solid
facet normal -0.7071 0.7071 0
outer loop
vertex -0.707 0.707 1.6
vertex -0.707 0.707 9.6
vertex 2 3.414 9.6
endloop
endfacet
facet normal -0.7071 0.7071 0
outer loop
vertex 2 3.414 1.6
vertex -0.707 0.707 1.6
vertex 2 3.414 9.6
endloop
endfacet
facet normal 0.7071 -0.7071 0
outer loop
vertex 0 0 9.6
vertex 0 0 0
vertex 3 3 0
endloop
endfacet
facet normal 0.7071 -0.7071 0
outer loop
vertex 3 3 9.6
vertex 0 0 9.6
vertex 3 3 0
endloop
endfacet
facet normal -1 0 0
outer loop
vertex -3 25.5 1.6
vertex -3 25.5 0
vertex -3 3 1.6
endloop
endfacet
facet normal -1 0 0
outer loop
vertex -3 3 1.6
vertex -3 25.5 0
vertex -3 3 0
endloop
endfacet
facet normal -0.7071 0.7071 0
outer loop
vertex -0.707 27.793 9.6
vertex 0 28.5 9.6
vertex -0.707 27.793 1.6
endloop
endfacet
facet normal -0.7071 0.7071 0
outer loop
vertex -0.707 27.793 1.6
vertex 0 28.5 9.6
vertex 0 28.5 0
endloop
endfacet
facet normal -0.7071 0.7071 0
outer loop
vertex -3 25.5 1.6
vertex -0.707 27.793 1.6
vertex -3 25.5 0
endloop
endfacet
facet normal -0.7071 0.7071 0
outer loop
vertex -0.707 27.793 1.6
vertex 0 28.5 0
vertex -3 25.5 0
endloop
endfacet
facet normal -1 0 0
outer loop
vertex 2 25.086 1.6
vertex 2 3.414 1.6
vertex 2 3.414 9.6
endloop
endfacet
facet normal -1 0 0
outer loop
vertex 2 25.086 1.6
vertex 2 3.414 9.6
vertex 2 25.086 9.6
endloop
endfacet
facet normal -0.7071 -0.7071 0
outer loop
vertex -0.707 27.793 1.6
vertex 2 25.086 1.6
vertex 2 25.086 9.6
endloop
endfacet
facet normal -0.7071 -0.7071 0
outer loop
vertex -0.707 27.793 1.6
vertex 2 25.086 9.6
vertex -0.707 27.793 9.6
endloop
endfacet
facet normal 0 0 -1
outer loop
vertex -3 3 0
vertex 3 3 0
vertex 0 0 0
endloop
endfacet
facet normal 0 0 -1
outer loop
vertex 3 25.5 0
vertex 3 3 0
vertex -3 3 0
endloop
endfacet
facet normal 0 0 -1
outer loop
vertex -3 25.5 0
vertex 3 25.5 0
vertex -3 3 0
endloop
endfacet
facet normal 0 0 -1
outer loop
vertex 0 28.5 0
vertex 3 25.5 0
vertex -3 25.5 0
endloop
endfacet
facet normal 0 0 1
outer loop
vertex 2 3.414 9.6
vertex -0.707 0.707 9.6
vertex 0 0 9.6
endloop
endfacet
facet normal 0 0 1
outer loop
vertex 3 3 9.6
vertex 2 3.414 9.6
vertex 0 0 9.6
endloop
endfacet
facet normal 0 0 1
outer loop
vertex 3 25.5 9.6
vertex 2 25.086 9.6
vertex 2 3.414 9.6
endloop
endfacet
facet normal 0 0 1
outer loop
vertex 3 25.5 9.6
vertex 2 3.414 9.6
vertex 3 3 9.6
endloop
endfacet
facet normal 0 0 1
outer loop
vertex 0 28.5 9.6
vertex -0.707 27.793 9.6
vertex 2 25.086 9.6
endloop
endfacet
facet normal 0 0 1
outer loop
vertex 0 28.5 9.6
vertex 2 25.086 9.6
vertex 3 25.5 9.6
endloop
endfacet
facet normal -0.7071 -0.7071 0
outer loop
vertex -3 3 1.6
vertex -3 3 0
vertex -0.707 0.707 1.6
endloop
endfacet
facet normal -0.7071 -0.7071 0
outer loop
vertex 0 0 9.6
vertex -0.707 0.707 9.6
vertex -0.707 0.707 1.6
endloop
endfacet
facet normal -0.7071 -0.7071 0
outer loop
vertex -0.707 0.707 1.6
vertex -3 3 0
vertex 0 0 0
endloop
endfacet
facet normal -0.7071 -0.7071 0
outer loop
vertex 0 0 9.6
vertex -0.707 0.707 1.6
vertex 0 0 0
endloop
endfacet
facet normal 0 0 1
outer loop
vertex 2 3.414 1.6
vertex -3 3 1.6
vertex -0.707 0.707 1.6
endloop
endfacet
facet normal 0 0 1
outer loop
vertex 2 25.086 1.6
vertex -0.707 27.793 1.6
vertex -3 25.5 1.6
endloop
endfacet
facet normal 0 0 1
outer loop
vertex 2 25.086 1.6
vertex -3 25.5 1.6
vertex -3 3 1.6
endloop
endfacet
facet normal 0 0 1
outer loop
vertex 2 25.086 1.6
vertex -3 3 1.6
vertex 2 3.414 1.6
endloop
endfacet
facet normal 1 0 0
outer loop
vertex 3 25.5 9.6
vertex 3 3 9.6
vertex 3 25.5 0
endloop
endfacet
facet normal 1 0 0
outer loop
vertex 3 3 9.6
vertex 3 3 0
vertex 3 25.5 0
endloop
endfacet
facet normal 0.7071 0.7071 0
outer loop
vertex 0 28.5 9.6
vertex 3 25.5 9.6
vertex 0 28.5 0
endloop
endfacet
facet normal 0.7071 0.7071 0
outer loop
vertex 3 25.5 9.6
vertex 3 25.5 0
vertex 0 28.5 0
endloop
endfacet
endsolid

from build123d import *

# Parameters (mm, degrees)
EXTRUDE_1_DEPTH     = 1.6
EXTRUDE_2_DEPTH     = 8
CUT_EXTRUDE_1_DEPTH = 8


with BuildPart() as part:
    # 草图1 → 凸台-拉伸1 (new body)
    with BuildSketch(Plane.XY):
        Polygon((0, 0), (-3, 3), (-3, 25.5), (0, 28.5), (3, 25.5), (3, 3), align=None)
    extrude(amount=EXTRUDE_1_DEPTH)

    # 草图2 → 凸台-拉伸2 (add)
    with BuildSketch(Plane.XY.offset(1.6)):
        Polygon((0, 0), (3, 3), (3, 25.5), (0, 28.5), (-3, 25.5), (-3, 3), align=None)
        Polygon((0, 1.414213562), (2, 3.414213562), (2, 25.085786438), (0, 27.085786438), (-2, 25.085786438), (-2, 3.414213562), align=None, mode=Mode.SUBTRACT)
    extrude(amount=EXTRUDE_2_DEPTH)

    # 草图3 → 切除-拉伸1 (cut)
    with BuildSketch(Plane.XY.offset(9.6)):
        Polygon((0, 27.085786438), (-0.707106781, 27.792893219), (-3, 25.5), (-3, 3), (-0.707106781, 0.707106781), (0, 1.414213562), (-2, 3.414213562), (-2, 25.085786438), align=None)
    extrude(amount=-CUT_EXTRUDE_1_DEPTH, mode=Mode.SUBTRACT)


solid = part.part
